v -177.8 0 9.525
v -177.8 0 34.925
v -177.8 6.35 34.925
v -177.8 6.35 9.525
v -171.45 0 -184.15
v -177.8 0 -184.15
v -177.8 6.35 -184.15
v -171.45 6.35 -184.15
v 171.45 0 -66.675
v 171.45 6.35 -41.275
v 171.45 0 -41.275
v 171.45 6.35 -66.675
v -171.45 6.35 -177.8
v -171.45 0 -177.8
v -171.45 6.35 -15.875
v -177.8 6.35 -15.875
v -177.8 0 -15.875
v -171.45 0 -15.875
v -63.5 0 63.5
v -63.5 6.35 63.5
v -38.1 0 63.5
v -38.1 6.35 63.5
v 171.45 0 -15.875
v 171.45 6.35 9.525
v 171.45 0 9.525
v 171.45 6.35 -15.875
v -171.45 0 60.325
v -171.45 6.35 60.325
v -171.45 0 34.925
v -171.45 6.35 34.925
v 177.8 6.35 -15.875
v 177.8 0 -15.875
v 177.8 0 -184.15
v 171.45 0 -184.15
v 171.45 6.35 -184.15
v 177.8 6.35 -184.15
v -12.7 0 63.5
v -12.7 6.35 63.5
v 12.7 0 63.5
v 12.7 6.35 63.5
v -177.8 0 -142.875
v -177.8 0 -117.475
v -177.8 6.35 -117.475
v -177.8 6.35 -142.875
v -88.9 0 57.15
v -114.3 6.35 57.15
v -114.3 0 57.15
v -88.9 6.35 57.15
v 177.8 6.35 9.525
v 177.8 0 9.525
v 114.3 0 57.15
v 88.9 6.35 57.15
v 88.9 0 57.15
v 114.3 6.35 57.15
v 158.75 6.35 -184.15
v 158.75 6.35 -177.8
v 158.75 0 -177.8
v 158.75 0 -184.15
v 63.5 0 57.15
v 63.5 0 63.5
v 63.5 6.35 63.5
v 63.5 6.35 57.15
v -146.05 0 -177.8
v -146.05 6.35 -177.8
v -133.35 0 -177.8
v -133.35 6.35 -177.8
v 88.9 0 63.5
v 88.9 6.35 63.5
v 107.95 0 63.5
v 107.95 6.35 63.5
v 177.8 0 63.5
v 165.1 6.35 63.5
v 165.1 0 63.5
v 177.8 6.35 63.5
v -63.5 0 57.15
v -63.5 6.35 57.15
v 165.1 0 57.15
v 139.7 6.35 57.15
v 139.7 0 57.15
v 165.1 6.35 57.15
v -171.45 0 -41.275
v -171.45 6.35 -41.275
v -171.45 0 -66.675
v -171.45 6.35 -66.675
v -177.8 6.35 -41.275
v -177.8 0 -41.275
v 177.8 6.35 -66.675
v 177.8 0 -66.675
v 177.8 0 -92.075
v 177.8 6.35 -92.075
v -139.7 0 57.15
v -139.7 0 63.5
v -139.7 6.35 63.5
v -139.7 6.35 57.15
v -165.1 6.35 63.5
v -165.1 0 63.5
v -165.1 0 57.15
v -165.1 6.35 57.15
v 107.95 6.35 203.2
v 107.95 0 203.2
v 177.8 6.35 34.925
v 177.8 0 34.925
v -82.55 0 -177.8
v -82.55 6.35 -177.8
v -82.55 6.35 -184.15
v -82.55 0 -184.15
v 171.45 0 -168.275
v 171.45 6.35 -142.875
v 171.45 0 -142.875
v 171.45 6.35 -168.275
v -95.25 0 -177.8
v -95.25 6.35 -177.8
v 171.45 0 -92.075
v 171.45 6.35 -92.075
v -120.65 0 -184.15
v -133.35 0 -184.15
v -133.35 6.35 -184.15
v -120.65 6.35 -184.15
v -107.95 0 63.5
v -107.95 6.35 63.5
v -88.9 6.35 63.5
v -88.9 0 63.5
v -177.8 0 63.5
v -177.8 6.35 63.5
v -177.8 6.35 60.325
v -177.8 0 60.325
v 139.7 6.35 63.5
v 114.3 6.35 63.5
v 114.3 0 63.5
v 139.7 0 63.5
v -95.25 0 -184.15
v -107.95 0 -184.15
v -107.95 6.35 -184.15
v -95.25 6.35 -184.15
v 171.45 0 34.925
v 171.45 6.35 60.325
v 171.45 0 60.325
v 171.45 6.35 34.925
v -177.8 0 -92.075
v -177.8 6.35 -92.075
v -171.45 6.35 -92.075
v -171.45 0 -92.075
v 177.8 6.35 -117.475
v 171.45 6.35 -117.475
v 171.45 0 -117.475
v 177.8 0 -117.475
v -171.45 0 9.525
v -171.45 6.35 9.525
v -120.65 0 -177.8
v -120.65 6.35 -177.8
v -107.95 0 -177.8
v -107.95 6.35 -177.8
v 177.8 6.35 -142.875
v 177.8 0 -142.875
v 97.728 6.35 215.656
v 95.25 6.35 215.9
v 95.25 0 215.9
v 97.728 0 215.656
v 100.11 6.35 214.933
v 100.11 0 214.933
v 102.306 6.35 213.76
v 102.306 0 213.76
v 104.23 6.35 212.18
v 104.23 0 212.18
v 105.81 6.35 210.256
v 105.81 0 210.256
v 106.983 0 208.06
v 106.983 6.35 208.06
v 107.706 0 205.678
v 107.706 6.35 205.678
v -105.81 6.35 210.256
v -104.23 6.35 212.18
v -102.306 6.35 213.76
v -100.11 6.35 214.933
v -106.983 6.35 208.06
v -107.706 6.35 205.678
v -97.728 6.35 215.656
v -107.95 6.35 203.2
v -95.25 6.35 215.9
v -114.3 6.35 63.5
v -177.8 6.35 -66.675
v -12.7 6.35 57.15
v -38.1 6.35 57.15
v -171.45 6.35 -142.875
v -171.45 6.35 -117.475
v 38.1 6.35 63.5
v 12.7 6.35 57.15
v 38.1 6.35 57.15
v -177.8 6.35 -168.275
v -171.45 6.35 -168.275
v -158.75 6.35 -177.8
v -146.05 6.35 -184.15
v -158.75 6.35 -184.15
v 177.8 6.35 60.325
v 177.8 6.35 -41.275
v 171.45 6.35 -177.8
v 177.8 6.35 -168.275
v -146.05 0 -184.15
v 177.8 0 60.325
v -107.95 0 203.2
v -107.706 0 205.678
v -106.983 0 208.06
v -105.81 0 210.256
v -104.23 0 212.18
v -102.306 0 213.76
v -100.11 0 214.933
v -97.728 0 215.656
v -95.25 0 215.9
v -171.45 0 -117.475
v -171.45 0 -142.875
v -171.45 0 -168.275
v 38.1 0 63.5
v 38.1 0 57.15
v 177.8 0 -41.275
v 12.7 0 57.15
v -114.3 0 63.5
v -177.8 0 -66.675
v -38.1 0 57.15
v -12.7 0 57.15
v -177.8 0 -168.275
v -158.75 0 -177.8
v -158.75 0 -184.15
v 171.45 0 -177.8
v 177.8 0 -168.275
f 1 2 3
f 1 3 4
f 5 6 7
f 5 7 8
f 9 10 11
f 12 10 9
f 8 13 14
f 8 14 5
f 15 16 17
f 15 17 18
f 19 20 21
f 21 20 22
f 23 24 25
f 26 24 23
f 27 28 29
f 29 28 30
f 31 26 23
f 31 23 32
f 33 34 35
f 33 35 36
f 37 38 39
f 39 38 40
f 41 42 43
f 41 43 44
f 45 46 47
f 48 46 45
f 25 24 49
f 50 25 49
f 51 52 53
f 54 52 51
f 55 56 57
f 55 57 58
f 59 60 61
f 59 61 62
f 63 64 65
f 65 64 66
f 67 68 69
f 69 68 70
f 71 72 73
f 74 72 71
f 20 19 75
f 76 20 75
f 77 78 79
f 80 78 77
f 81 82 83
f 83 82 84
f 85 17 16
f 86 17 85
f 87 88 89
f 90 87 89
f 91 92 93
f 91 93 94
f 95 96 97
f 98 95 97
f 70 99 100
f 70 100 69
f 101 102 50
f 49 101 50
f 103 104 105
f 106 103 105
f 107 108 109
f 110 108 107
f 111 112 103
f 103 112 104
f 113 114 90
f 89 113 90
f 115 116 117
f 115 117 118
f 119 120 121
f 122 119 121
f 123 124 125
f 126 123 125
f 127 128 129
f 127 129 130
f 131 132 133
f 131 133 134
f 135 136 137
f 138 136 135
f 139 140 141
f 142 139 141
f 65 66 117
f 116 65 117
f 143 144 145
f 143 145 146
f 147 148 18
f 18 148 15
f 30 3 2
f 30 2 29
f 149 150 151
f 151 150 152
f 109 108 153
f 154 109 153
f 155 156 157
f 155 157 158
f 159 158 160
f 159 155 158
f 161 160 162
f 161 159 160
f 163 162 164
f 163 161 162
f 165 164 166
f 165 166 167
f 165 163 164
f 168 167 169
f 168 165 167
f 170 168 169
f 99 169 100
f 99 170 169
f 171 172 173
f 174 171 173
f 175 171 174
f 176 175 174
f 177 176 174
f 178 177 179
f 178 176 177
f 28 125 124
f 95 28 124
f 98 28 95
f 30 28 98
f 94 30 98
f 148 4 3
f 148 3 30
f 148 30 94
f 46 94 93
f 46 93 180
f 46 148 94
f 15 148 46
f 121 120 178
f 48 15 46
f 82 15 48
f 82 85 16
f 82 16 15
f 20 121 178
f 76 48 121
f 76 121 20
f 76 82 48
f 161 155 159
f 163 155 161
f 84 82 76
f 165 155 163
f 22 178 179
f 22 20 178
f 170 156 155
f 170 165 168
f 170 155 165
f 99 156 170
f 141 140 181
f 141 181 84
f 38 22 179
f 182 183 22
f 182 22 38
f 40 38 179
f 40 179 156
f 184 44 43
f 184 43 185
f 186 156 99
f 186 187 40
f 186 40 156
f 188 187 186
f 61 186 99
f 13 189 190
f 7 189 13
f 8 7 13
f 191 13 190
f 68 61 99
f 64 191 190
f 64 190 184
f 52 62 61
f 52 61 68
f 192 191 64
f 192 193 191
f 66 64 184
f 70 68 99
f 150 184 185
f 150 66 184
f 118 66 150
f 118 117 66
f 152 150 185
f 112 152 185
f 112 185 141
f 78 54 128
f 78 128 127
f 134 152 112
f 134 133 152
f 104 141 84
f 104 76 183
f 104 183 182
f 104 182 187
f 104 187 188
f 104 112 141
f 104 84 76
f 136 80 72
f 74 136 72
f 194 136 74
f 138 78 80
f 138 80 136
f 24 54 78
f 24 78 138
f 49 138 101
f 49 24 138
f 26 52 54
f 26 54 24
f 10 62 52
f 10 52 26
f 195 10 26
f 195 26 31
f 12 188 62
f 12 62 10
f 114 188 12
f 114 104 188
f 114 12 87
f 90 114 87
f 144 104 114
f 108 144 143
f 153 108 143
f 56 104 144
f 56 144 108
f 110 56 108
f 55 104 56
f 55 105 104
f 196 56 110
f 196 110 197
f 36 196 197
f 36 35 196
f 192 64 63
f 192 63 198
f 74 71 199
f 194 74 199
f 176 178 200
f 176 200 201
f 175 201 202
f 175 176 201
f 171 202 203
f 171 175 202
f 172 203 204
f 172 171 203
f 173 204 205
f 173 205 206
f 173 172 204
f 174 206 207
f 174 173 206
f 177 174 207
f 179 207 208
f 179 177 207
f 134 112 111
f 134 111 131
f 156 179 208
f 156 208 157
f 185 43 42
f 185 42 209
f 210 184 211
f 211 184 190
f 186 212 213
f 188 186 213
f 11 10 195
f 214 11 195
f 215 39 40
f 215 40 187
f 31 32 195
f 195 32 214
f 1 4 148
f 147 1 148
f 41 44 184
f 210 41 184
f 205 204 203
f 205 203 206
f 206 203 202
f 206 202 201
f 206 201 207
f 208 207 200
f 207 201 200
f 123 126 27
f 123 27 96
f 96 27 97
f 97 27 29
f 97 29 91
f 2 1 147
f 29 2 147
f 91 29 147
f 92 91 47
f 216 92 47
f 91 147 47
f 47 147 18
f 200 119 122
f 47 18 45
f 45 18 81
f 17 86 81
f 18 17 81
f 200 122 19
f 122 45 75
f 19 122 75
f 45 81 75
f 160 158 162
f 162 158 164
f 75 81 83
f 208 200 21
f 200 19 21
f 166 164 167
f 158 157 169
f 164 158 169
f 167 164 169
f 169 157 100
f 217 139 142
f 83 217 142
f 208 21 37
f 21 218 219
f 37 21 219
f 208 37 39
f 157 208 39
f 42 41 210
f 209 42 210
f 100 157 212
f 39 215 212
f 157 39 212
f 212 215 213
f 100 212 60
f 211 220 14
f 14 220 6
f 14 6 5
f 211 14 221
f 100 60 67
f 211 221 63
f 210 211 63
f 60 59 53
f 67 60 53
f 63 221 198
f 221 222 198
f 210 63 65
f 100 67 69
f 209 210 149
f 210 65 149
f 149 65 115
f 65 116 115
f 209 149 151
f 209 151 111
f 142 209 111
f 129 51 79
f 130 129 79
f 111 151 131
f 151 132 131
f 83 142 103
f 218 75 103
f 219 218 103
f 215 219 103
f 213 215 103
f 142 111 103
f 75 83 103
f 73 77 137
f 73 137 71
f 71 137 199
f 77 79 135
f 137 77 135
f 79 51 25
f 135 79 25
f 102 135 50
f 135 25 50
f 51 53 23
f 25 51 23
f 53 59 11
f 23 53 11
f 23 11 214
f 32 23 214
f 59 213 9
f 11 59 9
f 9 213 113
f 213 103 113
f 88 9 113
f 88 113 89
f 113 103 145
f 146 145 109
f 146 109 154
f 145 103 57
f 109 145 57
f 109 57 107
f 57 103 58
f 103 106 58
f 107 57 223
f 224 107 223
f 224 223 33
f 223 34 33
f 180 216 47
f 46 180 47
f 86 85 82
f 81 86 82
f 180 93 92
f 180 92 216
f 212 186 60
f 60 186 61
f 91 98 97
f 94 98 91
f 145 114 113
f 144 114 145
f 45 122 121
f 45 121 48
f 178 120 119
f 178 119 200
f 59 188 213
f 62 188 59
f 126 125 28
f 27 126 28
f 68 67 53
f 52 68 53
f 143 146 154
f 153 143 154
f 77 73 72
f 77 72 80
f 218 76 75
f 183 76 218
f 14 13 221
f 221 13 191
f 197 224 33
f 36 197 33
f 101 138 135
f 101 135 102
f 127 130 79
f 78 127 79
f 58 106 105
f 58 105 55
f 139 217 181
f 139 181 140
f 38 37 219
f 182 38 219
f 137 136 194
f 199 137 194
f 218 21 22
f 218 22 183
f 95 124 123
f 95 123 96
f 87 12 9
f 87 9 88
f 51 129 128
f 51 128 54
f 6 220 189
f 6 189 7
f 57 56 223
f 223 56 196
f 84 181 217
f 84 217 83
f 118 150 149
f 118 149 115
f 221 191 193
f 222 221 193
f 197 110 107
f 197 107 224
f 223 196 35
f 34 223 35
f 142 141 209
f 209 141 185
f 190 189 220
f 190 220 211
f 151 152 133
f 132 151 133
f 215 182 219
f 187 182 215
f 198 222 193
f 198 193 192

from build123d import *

# Parameters (mm, degrees)
ESQUISSE1_W                     = 355.6
ESQUISSE1_H                     = 368.3
BOSS_EXTRU_1_DEPTH              = 6.35
ESQUISSE2_W                     = 6.35
ESQUISSE2_H                     = 25.4
ENL_V_MAT_EXTRU_1_DEPTH         = 6.35
R_P_TITION_LIN_AIRE1_COUNT      = 7
R_P_TITION_LIN_AIRE1_PITCH      = 50.8
R_P_TITION_LIN_AIRE1_COUNT_DIR2 = 2
R_P_TITION_LIN_AIRE1_PITCH_DIR2 = 349.25
ESQUISSE3_W                     = 25.4
ESQUISSE3_H                     = 6.35
ENL_V_MAT_EXTRU_2_DEPTH         = 6.35
R_P_TITION_LIN_AIRE2_COUNT      = 7
R_P_TITION_LIN_AIRE2_PITCH      = 50.8
ESQUISSE4_W                     = 25.4
ESQUISSE4_H                     = 6.35
ENL_V_MAT_EXTRU_3_DEPTH         = 6.35
R_P_TITION_LIN_AIRE3_COUNT      = 7
R_P_TITION_LIN_AIRE3_PITCH      = 50.8
ESQUISSE5_W                     = 12.7
ESQUISSE5_H                     = 6.35
ENL_V_MAT_EXTRU_4_DEPTH         = 6.35
SKETCH3_W                       = 355.521495667
SKETCH3_H                       = 214.90407248
BOSS_EXTRUDE1_DEPTH             = 6.35
CUT_EXTRUDE2_DEPTH              = 331.396716197


with BuildPart() as part:
    # Esquisse1 → Boss.-Extru.1 (new body)
    with BuildSketch(Plane(origin=(0, 0, 0), x_dir=(1, 0, 0), z_dir=(0, 1, 0))):
        Rectangle(ESQUISSE1_W, ESQUISSE1_H)
    extrude(amount=BOSS_EXTRU_1_DEPTH)

    # Esquisse2 → Enlèv. mat.-Extru.1 (cut)
    with BuildSketch(Plane(origin=(0, 6.35, 0), x_dir=(1, 0, 0), z_dir=(0, 1, 0))):
        with Locations((174.625, -149.225)):
            Rectangle(ESQUISSE2_W, ESQUISSE2_H)
    enl_v_mat_extru_1 = extrude(amount=-ENL_V_MAT_EXTRU_1_DEPTH, mode=Mode.SUBTRACT)

    # Répétition linéaire1: Enl_v. mat.-Extru.1 7 × 2
    with Locations(*[(-j * R_P_TITION_LIN_AIRE1_PITCH_DIR2, 0, -i * R_P_TITION_LIN_AIRE1_PITCH) for i in range(R_P_TITION_LIN_AIRE1_COUNT) for j in range(R_P_TITION_LIN_AIRE1_COUNT_DIR2) if (i, j) != (0, 0)]):
        add(enl_v_mat_extru_1, mode=Mode.SUBTRACT)

    # Esquisse3 → Enlèv. mat.-Extru.2 (cut)
    with BuildSketch(Plane(origin=(0, 6.35, 0), x_dir=(1, 0, 0), z_dir=(0, 1, 0))):
        with Locations((-152.4, -180.975)):
            Rectangle(ESQUISSE3_W, ESQUISSE3_H)
    enl_v_mat_extru_2 = extrude(amount=-ENL_V_MAT_EXTRU_2_DEPTH, mode=Mode.SUBTRACT)

    # Répétition linéaire2: Enlèv. mat.-Extru.2 ×7
    with Locations(*[(i * R_P_TITION_LIN_AIRE2_PITCH, 0, 0) for i in range(1, R_P_TITION_LIN_AIRE2_COUNT)]):
        add(enl_v_mat_extru_2, mode=Mode.SUBTRACT)

    # Esquisse4 → Enlèv. mat.-Extru.3 (cut)
    with BuildSketch(Plane(origin=(0, 6.35, 0), x_dir=(1, 0, 0), z_dir=(0, 1, 0))):
        with Locations((-152.4, -60.325)):
            Rectangle(ESQUISSE4_W, ESQUISSE4_H)
    enl_v_mat_extru_3 = extrude(amount=-ENL_V_MAT_EXTRU_3_DEPTH, mode=Mode.SUBTRACT)

    # Répétition linéaire3: Enlèv. mat.-Extru.3 ×7
    with Locations(*[(i * R_P_TITION_LIN_AIRE3_PITCH, 0, 0) for i in range(1, R_P_TITION_LIN_AIRE3_COUNT)]):
        add(enl_v_mat_extru_3, mode=Mode.SUBTRACT)

    # Esquisse5 → Enlèv. mat.-Extru.4 (cut)
    with BuildSketch(Plane(origin=(0, 6.35, 0), x_dir=(1, 0, 0), z_dir=(0, 1, 0))):
        with Locations((-165.1, 180.975)):
            Rectangle(ESQUISSE5_W, ESQUISSE5_H)
        with Locations((165.1, 180.975)):
            Rectangle(ESQUISSE5_W, ESQUISSE5_H)
        with Locations((-139.7, 180.975)):
            Rectangle(ESQUISSE5_W, ESQUISSE5_H)
        with Locations((-114.3, 180.975)):
            Rectangle(ESQUISSE5_W, ESQUISSE5_H)
        with Locations((-88.9, 180.975)):
            Rectangle(ESQUISSE5_W, ESQUISSE5_H)
    extrude(amount=-ENL_V_MAT_EXTRU_4_DEPTH, mode=Mode.SUBTRACT)

    # Sketch3 → Boss-Extrude1 (add)
    with BuildSketch(Plane(origin=(0, 6.35, 0), x_dir=(1, 0, 0), z_dir=(0, 1, 0))):
        with Locations((-0.039252167, -170.95203624)):
            Rectangle(SKETCH3_W, SKETCH3_H)
    extrude(amount=-BOSS_EXTRUDE1_DEPTH)

    # Sketch1 → Cut-Extrude2 (cut, through all)
    with BuildSketch(Plane(origin=(0, 6.35, 0), x_dir=(1, 0, 0), z_dir=(0, 1, 0))):
        with BuildLine():
            Line((-95.25, -215.9), (95.25, -215.9))
            ThreePointArc((95.25, -215.9), (104.230256121, -212.180256121), (107.95, -203.2))
            Line((107.95, -203.2), (107.95, -63.5))
            Line((107.95, -63.5), (177.8, -63.5))
            Line((177.8, -63.5), (177.8, -278.40407248))
            Line((177.8, -278.40407248), (-177.8, -278.40407248))
            Line((-177.8, -278.40407248), (-177.8, -63.5))
            Line((-177.8, -63.5), (-107.95, -63.5))
            Line((-107.95, -63.5), (-107.95, -203.2))
            ThreePointArc((-107.95, -203.2), (-104.230256121, -212.180256121), (-95.25, -215.9))
        make_face()
    extrude(amount=-CUT_EXTRUDE2_DEPTH, mode=Mode.SUBTRACT)


solid = part.part
